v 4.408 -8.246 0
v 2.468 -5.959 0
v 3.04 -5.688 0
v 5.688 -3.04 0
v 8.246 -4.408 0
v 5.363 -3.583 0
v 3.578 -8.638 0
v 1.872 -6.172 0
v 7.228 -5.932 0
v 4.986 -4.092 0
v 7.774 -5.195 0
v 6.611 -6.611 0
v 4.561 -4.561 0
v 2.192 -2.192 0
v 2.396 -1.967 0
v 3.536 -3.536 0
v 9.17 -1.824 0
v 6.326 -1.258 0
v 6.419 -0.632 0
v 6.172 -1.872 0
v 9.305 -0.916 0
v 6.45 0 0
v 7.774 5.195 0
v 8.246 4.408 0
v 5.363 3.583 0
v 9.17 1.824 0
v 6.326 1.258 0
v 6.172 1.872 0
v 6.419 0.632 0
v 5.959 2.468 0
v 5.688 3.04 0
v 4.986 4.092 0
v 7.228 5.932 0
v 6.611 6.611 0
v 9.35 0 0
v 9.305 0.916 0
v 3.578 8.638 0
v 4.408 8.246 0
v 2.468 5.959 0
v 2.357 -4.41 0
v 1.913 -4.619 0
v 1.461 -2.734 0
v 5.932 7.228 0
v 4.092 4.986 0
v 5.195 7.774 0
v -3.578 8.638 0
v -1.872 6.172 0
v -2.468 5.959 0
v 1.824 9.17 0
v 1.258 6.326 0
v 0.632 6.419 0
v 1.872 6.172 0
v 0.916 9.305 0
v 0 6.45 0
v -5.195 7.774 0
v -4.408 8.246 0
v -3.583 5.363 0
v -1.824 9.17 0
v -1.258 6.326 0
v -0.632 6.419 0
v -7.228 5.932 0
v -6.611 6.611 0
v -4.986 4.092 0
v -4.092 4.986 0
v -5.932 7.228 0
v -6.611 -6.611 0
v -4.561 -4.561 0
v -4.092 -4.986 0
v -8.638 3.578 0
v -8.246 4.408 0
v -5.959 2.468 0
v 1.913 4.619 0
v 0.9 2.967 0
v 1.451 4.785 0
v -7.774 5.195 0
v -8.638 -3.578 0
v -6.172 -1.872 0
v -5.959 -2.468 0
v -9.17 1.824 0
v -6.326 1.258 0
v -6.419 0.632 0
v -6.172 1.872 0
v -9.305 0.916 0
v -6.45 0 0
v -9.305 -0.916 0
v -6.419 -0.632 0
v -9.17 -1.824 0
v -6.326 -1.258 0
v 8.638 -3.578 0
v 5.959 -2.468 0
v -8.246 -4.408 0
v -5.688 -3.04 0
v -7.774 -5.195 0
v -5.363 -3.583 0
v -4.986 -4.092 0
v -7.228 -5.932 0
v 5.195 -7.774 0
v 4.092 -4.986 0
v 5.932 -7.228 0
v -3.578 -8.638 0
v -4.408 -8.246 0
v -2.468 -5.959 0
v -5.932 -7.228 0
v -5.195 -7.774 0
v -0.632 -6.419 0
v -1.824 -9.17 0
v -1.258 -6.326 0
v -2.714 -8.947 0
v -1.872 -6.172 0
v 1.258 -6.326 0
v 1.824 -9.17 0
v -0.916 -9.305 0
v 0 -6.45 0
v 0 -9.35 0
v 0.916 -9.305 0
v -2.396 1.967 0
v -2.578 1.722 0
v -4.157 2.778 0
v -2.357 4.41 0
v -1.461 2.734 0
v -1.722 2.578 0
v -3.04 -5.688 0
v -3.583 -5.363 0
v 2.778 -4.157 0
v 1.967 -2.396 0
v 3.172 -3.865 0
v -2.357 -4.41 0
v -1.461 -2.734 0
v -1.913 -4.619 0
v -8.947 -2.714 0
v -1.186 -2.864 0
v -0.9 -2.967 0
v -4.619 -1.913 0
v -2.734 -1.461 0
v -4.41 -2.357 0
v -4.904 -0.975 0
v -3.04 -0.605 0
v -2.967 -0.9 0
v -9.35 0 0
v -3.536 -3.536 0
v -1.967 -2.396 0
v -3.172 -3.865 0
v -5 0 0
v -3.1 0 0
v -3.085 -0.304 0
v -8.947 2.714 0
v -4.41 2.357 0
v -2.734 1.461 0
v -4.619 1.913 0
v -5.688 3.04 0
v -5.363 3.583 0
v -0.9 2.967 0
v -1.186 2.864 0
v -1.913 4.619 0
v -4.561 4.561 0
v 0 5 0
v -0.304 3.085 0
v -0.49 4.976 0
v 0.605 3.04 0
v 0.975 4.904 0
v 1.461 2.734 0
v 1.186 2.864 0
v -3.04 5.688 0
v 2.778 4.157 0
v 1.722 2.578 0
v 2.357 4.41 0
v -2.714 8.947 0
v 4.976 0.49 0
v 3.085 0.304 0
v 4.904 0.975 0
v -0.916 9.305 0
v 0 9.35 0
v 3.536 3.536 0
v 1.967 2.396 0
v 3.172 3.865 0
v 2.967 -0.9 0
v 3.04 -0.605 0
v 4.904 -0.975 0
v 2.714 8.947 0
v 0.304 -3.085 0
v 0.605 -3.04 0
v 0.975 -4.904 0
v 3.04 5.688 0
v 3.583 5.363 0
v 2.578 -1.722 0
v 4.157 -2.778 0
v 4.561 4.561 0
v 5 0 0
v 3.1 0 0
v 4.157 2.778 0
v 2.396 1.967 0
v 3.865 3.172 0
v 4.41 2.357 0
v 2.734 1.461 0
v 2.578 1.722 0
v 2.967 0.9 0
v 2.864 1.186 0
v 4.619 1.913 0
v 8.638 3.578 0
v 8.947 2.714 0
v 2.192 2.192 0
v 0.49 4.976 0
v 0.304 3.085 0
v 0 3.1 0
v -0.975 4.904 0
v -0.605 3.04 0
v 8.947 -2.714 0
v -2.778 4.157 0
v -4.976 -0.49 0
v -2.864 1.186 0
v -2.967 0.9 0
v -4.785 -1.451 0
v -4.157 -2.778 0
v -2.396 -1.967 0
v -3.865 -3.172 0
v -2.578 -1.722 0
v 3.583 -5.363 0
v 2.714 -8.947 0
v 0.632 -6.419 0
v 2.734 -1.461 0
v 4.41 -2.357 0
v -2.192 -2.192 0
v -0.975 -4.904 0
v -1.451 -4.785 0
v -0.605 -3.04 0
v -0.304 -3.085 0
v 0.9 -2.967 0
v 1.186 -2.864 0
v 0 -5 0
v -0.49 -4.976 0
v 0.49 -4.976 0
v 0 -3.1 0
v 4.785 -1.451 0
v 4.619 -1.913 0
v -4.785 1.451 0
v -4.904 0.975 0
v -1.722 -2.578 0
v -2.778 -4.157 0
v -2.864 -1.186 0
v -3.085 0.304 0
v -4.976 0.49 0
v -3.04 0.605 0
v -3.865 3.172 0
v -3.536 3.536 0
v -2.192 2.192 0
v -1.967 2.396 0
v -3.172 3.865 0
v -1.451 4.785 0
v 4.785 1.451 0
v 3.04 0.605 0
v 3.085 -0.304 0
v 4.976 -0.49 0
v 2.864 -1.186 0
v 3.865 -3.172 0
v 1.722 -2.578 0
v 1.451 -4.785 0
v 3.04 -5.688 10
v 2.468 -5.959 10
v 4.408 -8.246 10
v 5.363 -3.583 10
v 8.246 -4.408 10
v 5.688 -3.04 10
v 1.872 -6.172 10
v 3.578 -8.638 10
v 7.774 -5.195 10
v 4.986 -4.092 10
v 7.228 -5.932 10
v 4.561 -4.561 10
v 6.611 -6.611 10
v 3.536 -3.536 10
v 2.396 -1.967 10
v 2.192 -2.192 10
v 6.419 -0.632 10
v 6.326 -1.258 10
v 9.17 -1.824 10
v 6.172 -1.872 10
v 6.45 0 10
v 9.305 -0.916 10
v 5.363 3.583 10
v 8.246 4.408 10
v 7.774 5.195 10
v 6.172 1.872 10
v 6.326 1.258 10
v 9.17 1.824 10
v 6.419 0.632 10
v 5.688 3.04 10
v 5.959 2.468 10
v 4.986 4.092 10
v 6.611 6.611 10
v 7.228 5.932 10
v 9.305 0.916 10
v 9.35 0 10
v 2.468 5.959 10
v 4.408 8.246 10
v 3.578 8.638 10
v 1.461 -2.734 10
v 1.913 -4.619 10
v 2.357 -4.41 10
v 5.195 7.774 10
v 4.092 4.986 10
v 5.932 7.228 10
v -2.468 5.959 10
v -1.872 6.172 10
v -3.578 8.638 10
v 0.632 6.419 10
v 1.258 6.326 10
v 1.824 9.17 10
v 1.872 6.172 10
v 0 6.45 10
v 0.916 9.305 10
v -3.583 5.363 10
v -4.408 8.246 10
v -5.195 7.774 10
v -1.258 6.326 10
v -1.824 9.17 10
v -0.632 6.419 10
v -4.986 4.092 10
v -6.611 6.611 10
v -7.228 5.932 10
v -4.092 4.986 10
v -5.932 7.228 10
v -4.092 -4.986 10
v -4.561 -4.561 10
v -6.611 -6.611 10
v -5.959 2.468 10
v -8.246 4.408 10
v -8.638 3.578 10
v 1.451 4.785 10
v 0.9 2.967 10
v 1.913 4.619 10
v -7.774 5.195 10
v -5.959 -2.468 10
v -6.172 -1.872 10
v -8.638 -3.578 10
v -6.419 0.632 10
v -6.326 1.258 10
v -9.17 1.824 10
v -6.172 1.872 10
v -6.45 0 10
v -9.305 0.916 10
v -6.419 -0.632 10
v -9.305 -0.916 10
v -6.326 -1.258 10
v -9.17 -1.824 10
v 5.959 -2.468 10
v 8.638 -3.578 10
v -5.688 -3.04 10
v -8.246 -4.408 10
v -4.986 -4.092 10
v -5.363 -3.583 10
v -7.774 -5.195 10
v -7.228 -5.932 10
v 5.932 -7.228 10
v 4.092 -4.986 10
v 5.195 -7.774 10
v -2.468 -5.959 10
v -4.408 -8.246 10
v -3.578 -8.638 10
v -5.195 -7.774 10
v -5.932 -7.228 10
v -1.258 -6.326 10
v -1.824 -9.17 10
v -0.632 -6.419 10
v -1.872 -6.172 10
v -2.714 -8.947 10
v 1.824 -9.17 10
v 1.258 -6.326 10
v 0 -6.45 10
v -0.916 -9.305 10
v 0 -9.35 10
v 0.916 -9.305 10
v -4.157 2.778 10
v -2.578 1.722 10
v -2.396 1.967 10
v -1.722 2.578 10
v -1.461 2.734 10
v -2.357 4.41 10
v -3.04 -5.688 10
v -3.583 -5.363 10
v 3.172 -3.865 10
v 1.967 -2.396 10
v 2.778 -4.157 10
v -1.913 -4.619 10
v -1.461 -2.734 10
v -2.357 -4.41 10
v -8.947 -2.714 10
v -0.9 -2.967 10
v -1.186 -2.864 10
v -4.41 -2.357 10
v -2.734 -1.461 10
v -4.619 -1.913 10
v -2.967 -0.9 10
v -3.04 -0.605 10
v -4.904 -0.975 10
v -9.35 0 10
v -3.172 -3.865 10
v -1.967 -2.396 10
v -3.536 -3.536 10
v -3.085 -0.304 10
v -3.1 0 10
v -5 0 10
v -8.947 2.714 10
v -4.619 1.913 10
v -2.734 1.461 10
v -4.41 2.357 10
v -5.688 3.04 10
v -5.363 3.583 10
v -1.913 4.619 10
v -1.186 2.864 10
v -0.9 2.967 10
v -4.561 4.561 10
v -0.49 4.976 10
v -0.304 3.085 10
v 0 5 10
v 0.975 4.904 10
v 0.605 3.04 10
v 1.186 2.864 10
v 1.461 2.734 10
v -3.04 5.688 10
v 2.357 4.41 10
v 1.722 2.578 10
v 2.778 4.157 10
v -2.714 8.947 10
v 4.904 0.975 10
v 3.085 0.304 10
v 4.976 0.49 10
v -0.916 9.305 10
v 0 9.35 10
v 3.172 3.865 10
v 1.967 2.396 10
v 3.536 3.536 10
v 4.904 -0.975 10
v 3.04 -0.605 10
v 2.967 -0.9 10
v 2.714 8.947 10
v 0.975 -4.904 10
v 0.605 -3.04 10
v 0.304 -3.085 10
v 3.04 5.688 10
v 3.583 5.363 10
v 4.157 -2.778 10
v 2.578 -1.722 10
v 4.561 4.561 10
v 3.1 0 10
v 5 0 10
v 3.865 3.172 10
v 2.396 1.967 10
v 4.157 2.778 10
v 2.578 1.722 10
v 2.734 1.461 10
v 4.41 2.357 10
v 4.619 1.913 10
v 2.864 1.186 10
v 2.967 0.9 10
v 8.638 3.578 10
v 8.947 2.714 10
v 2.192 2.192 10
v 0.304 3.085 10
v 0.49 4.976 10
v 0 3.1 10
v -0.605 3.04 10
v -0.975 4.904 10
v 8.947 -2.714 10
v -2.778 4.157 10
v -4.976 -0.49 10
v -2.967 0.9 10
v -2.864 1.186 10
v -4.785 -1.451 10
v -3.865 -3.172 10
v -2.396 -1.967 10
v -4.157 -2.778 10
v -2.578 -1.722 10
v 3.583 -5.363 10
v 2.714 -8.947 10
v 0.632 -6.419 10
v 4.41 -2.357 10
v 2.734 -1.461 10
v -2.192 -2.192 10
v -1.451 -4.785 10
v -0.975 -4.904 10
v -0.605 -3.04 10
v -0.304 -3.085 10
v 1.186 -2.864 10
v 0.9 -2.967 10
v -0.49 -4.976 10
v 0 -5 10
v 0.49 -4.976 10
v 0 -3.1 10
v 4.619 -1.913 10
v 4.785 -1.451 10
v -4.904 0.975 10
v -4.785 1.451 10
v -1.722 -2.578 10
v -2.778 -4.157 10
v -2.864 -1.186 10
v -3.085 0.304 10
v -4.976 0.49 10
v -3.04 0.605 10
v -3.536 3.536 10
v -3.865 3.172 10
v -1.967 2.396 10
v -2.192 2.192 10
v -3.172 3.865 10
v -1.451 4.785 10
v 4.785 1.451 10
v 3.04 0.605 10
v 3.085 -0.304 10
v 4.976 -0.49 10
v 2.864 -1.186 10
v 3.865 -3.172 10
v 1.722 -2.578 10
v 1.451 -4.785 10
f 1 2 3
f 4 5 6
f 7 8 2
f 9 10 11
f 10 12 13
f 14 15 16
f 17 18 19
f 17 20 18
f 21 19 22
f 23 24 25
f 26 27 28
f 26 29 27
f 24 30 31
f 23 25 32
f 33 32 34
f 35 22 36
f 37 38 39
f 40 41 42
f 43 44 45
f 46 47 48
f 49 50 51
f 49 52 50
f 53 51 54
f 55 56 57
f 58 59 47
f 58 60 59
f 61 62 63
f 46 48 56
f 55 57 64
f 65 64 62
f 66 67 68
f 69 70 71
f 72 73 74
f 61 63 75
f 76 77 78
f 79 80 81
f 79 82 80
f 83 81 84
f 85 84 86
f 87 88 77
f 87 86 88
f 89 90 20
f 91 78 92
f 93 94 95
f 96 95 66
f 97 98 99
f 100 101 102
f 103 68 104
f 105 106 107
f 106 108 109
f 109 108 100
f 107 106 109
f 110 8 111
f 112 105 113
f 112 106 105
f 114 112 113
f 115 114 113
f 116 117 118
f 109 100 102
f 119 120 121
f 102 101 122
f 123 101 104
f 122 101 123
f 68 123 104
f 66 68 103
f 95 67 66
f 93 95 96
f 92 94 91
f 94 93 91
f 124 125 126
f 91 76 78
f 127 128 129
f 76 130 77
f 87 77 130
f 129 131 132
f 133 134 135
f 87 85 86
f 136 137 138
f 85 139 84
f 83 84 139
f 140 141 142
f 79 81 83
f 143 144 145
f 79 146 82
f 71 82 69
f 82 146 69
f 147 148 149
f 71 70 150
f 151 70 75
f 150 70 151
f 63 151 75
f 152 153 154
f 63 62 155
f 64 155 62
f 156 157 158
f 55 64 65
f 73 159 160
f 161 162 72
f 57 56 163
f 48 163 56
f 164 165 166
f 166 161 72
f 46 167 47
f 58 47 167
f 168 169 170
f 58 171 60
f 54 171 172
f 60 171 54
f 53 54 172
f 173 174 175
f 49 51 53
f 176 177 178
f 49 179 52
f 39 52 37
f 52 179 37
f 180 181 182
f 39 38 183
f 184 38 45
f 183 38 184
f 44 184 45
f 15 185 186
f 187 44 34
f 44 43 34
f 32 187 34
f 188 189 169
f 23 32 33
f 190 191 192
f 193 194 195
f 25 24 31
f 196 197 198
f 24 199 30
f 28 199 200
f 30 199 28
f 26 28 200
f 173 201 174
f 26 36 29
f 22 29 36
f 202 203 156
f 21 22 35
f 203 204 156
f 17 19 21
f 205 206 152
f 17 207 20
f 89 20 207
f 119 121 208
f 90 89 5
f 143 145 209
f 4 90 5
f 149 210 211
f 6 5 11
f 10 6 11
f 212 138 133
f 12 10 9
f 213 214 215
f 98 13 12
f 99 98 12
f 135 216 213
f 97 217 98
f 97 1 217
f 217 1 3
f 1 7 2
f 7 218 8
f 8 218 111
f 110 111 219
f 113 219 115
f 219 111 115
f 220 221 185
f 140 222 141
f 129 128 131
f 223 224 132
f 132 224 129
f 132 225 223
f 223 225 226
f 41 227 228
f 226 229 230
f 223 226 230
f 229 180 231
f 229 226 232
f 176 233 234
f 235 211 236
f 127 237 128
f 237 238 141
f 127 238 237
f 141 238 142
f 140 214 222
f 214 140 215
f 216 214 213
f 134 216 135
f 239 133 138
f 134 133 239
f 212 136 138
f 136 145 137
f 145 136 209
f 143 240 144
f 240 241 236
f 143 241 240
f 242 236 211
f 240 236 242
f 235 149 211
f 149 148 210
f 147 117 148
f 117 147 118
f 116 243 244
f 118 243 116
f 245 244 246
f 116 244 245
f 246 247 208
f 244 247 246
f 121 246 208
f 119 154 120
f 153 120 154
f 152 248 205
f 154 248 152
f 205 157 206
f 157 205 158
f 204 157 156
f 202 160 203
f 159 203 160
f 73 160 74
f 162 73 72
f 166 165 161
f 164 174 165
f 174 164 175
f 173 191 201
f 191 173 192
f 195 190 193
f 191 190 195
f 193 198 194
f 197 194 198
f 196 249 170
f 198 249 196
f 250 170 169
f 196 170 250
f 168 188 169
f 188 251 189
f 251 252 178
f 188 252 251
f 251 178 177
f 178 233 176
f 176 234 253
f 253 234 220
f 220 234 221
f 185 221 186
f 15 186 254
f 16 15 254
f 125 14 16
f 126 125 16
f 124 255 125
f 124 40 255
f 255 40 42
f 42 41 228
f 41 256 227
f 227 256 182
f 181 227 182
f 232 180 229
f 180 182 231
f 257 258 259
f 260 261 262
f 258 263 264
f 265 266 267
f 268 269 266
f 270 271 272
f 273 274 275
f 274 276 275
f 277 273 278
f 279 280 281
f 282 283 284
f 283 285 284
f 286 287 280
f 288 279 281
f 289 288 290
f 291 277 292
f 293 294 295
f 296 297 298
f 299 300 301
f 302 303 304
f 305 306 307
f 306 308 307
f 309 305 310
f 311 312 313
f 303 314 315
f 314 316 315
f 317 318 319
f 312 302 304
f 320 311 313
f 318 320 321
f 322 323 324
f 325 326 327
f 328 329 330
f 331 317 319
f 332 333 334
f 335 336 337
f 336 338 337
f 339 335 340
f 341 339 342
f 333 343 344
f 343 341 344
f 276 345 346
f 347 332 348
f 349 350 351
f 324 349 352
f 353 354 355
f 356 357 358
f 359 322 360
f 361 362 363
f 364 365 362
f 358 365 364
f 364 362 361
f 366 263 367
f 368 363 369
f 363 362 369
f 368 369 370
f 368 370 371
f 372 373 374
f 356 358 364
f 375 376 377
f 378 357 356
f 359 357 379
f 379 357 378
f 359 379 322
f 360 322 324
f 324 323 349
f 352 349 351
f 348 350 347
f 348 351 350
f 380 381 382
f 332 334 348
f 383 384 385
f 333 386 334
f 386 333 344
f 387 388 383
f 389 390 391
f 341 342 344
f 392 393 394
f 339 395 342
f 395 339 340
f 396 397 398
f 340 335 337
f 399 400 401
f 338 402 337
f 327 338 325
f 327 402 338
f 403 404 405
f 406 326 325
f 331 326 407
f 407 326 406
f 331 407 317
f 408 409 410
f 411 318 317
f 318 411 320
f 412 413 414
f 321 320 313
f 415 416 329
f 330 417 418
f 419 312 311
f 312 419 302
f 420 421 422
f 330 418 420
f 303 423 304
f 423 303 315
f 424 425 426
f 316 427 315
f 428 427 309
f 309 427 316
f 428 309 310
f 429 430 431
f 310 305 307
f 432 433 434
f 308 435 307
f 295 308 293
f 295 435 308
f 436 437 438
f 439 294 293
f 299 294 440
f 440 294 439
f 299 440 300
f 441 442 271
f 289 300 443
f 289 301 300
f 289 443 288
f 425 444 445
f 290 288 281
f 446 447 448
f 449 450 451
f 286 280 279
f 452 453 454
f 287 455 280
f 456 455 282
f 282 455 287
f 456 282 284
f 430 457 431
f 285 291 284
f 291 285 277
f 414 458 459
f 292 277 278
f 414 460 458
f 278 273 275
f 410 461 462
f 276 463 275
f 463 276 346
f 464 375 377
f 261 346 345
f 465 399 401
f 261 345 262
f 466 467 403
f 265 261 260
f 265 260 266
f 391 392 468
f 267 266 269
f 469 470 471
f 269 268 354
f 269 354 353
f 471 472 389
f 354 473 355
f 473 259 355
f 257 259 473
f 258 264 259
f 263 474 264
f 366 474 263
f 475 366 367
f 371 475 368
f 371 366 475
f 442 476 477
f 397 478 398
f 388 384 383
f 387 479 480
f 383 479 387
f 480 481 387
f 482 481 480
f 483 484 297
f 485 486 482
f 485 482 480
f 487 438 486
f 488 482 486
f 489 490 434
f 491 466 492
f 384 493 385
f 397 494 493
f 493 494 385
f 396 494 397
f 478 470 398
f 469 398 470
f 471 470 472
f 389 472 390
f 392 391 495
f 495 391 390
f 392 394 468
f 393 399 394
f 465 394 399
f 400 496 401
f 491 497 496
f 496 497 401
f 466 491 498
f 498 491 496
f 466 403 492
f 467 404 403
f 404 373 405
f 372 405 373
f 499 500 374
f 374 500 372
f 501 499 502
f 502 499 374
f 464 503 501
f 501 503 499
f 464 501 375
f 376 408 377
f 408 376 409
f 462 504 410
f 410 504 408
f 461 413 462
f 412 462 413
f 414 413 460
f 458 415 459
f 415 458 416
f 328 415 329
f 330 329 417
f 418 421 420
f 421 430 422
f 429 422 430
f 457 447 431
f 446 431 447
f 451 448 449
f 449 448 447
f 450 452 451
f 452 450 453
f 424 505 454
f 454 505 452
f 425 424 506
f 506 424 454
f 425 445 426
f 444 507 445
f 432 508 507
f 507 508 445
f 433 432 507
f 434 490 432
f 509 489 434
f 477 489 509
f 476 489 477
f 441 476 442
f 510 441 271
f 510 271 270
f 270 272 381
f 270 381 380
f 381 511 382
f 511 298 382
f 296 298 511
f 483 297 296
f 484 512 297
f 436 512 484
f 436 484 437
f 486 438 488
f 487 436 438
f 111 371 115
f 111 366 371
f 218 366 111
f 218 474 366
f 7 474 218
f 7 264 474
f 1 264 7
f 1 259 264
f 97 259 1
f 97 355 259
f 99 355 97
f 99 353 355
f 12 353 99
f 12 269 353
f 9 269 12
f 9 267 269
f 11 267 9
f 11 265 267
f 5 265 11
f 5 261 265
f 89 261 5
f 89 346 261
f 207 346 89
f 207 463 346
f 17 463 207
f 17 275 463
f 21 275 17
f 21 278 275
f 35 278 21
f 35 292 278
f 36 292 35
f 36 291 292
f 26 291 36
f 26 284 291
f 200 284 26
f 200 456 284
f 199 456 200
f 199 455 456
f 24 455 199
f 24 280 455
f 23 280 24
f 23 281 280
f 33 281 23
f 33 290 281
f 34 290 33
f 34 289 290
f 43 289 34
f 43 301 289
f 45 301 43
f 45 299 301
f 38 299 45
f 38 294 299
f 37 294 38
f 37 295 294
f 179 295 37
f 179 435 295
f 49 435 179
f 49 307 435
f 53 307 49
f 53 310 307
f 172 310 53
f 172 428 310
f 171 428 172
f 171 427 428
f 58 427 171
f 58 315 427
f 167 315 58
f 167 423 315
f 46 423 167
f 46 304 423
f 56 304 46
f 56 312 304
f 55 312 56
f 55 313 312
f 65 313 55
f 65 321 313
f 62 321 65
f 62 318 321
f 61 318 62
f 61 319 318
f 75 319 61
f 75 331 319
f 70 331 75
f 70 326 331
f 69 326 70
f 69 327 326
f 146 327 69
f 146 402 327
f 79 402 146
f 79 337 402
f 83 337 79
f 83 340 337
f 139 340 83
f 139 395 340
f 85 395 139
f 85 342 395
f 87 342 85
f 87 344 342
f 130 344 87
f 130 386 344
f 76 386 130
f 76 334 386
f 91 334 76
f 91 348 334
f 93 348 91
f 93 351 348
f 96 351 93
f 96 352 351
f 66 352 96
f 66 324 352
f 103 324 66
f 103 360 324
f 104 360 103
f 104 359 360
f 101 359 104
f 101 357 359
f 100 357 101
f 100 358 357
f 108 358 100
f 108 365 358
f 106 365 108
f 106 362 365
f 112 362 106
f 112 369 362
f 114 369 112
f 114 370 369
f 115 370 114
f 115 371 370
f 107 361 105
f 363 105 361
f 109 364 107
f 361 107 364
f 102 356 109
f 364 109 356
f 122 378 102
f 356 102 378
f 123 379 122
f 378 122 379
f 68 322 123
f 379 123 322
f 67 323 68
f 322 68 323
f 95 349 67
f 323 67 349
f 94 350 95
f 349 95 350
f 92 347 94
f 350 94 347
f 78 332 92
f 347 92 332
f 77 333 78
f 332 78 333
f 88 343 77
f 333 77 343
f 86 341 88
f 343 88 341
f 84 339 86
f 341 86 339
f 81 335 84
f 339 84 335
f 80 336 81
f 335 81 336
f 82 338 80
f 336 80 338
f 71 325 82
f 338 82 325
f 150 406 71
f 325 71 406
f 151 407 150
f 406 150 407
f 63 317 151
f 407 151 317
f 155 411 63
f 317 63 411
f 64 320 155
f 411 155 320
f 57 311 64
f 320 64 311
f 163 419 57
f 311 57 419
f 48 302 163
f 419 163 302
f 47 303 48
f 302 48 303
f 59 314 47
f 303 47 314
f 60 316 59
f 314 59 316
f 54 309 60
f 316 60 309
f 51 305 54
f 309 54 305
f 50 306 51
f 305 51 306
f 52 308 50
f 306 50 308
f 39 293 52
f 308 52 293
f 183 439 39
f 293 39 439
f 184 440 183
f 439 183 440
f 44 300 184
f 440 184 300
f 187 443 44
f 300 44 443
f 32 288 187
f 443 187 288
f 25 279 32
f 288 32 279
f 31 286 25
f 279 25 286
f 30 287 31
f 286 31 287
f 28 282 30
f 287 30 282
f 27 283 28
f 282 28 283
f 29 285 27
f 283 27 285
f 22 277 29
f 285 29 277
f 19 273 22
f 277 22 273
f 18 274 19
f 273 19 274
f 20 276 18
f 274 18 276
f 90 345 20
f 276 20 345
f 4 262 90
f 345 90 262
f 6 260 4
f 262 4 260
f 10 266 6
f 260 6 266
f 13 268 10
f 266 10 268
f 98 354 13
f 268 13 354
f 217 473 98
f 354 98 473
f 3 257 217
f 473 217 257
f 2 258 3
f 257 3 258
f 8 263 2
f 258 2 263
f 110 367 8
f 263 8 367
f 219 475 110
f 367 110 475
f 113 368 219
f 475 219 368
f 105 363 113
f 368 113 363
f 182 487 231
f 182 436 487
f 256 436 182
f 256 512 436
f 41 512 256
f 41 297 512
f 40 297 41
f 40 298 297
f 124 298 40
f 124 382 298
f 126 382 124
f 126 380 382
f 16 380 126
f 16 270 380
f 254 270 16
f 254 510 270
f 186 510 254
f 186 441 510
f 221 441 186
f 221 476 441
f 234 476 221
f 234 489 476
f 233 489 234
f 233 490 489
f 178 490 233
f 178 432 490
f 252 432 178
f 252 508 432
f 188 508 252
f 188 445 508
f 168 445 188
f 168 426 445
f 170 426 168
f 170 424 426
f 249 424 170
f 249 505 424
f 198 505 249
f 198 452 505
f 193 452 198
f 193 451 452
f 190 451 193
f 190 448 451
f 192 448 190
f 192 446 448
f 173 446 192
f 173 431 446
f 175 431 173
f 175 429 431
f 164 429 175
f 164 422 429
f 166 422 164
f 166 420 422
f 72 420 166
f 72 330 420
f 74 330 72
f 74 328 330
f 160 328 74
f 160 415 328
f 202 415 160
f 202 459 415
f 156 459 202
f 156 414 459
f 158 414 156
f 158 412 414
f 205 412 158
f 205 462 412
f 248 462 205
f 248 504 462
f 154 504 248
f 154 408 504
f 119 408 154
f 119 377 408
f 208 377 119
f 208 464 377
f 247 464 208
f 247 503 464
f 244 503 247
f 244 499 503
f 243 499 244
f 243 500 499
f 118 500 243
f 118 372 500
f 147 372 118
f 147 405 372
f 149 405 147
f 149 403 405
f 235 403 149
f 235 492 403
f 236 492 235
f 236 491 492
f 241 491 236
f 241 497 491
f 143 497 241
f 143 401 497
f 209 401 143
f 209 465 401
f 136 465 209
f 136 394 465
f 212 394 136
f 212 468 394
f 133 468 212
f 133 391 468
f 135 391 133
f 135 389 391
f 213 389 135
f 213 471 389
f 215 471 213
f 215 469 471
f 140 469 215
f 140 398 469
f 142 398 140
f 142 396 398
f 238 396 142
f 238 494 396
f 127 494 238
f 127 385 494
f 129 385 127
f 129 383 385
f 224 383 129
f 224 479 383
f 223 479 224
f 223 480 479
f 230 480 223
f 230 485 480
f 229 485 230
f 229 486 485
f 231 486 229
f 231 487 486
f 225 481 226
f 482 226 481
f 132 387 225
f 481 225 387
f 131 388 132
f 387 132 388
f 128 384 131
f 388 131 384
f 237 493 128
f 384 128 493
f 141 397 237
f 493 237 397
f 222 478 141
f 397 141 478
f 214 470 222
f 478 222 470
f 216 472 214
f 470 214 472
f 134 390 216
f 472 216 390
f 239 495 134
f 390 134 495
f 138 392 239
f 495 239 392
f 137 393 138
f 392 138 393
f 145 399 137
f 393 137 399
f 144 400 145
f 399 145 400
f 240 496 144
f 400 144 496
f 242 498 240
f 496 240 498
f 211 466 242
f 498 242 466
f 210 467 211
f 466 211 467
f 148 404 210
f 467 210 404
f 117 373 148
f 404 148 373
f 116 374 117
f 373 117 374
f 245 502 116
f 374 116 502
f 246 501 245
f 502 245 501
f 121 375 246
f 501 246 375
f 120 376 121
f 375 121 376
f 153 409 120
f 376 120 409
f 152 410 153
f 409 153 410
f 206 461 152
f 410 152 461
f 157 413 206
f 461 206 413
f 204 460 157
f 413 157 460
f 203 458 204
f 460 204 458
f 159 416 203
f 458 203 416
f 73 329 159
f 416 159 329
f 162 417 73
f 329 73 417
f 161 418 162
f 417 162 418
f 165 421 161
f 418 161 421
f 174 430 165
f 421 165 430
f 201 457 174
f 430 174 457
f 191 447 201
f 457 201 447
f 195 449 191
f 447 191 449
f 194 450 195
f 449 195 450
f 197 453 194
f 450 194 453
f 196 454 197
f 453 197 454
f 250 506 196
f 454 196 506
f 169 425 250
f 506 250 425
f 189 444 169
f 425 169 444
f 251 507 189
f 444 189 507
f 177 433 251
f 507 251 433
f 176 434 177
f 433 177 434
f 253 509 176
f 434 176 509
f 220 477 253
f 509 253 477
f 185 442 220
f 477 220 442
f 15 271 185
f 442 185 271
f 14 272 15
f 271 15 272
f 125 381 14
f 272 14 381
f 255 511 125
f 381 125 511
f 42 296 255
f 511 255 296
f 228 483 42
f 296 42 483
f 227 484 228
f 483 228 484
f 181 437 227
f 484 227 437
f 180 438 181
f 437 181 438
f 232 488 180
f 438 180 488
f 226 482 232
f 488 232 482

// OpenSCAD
// Snap-on Clip for Lab Stand Rod and Tubing

// Global settings
$fn = 64;

// Dimensions based on user input (in mm)
clip_height = 10;       // Total height of the clip extrusion (Z dimension)

// Rod Ring Dimensions (for 12.7mm rod)
rod_inner_diameter = 12.7; // Inner diameter for the lab stand rod
rod_wall_thickness = 3;    // Wall thickness of the ring
rod_outer_diameter = rod_inner_diameter + 2 * rod_wall_thickness; // Outer diameter (18.7mm)

// Rod Ring Cutout Dimensions
rod_cutout_width = 10;     // Width of the opening cut on the -X side
rod_cutout_y_range = 5;    // Y range for the cutout (-5 to 5)

// Tubing Ring Dimensions (for tubing)
tubing_inner_diameter = 6; // Inner diameter for the tubing
tubing_wall_thickness = 2;  // Wall thickness of the ring
tubing_outer_diameter = tubing_inner_diameter + 2 * tubing_wall_thickness; // Outer diameter (10mm)

// Tubing Ring Position and Cutout
tubing_center_x = 15;      // X position of the tubing ring center
tubing_cutout_width = 4.5;  // Width of the opening cut on the +X side
tubing_cutout_y_range = 2.25; // Y range for the cutout (-2.25 to 2.25)

// Bridge Dimensions
bridge_width_y = 6;       // Width in Y direction
bridge_start_x = 8;       // Start X coordinate of the bridge
bridge_end_x = 12;        // End X coordinate of the bridge


// --- Module Definitions ---

// Creates a hollow ring shape centered at (cx, cy)
module create_ring(inner_d, outer_d, cx, cy) {
    difference() {
        circle(r = outer_d / 2, center = [cx, cy]);
        // Cutout slightly larger than inner diameter to ensure clean hole
        circle(r = inner_d / 2 + 0.1, center = [cx, cy]); 
    }
}

// --- Component Construction (2D Profile) ---

module rod_ring() {
    // Base ring centered at origin
    create_ring(rod_inner_diameter, rod_outer_diameter, 0, 0);

    // Cutout on the -X side to snap onto the rod. The cutout must be positioned relative to its center point.
    // We want the cutout to span from X = -(OuterDiameter/2) to X = -(OuterDiameter/2) + RodCutoutWidth
    // Since we are cutting a rectangle, we define its center based on where it starts.
    cutout_center_x = -rod_outer_diameter / 2 + rod_cutout_width / 2;
    translate([cutout_center_x, 0, 0]) {
        difference() {
            // The cube must be large enough to cut through the ring material.
            cube([rod_cutout_width + 0.1, 2 * rod_cutout_y_range + 0.2, 0.1]);
            // Translate cutout vertically so it is centered around Y=0 relative to its own center point (which is at y=0 here)
            translate([0, -rod_cutout_y_range]) {
                cube([rod_cutout_width + 0.1, 2 * rod_cutout_y_range + 0.2, 0.1]);
            }
        }
    }
}

module tubing_ring() {
    // Base ring centered at (tubing_center_x, 0)
    create_ring(tubing_inner_diameter, tubing_outer_diameter, tubing_center_x, 0);

    // Cutout on the +X side to allow tubing passage.
    cutout_center_x = tubing_center_x + (tubing_outer_diameter / 2) - tubing_cutout_width / 2;
    translate([cutout_center_x, 0, 0]) {
        difference() {
            // The cube must be large enough to cut through the ring material.
            cube([tubing_cutout_width + 0.1, 2 * tubing_cutout_y_range + 0.2, 0.1]);
             // Translate cutout vertically so it is centered around Y=0 relative to its own center point (which is at y=0 here)
            translate([0, -tubing_cutout_y_range]) {
                cube([tubing_cutout_width + 0.1, 2 * tubing_cutout_y_range + 0.2, 0.1]);
            }
        }
    }
}

module bridge() {
    // Solid rectangular bridge connecting the two rings
    cube([bridge_end_x - bridge_start_x, bridge_width_y, 0.1]); // Thickness of the bridge profile
    translate([bridge_start_x, 0, 0]);
}


// --- Final Assembly (2D Profile) ---

module clip_profile() {
    union() {
        rod_ring();
        tubing_ring();
        bridge();
    }
}

// Extrude the final profile to create the 3D part
difference() {
    // Main body extrusion
    linear_extrude(height = clip_height) {
        clip_profile();
    }
}
